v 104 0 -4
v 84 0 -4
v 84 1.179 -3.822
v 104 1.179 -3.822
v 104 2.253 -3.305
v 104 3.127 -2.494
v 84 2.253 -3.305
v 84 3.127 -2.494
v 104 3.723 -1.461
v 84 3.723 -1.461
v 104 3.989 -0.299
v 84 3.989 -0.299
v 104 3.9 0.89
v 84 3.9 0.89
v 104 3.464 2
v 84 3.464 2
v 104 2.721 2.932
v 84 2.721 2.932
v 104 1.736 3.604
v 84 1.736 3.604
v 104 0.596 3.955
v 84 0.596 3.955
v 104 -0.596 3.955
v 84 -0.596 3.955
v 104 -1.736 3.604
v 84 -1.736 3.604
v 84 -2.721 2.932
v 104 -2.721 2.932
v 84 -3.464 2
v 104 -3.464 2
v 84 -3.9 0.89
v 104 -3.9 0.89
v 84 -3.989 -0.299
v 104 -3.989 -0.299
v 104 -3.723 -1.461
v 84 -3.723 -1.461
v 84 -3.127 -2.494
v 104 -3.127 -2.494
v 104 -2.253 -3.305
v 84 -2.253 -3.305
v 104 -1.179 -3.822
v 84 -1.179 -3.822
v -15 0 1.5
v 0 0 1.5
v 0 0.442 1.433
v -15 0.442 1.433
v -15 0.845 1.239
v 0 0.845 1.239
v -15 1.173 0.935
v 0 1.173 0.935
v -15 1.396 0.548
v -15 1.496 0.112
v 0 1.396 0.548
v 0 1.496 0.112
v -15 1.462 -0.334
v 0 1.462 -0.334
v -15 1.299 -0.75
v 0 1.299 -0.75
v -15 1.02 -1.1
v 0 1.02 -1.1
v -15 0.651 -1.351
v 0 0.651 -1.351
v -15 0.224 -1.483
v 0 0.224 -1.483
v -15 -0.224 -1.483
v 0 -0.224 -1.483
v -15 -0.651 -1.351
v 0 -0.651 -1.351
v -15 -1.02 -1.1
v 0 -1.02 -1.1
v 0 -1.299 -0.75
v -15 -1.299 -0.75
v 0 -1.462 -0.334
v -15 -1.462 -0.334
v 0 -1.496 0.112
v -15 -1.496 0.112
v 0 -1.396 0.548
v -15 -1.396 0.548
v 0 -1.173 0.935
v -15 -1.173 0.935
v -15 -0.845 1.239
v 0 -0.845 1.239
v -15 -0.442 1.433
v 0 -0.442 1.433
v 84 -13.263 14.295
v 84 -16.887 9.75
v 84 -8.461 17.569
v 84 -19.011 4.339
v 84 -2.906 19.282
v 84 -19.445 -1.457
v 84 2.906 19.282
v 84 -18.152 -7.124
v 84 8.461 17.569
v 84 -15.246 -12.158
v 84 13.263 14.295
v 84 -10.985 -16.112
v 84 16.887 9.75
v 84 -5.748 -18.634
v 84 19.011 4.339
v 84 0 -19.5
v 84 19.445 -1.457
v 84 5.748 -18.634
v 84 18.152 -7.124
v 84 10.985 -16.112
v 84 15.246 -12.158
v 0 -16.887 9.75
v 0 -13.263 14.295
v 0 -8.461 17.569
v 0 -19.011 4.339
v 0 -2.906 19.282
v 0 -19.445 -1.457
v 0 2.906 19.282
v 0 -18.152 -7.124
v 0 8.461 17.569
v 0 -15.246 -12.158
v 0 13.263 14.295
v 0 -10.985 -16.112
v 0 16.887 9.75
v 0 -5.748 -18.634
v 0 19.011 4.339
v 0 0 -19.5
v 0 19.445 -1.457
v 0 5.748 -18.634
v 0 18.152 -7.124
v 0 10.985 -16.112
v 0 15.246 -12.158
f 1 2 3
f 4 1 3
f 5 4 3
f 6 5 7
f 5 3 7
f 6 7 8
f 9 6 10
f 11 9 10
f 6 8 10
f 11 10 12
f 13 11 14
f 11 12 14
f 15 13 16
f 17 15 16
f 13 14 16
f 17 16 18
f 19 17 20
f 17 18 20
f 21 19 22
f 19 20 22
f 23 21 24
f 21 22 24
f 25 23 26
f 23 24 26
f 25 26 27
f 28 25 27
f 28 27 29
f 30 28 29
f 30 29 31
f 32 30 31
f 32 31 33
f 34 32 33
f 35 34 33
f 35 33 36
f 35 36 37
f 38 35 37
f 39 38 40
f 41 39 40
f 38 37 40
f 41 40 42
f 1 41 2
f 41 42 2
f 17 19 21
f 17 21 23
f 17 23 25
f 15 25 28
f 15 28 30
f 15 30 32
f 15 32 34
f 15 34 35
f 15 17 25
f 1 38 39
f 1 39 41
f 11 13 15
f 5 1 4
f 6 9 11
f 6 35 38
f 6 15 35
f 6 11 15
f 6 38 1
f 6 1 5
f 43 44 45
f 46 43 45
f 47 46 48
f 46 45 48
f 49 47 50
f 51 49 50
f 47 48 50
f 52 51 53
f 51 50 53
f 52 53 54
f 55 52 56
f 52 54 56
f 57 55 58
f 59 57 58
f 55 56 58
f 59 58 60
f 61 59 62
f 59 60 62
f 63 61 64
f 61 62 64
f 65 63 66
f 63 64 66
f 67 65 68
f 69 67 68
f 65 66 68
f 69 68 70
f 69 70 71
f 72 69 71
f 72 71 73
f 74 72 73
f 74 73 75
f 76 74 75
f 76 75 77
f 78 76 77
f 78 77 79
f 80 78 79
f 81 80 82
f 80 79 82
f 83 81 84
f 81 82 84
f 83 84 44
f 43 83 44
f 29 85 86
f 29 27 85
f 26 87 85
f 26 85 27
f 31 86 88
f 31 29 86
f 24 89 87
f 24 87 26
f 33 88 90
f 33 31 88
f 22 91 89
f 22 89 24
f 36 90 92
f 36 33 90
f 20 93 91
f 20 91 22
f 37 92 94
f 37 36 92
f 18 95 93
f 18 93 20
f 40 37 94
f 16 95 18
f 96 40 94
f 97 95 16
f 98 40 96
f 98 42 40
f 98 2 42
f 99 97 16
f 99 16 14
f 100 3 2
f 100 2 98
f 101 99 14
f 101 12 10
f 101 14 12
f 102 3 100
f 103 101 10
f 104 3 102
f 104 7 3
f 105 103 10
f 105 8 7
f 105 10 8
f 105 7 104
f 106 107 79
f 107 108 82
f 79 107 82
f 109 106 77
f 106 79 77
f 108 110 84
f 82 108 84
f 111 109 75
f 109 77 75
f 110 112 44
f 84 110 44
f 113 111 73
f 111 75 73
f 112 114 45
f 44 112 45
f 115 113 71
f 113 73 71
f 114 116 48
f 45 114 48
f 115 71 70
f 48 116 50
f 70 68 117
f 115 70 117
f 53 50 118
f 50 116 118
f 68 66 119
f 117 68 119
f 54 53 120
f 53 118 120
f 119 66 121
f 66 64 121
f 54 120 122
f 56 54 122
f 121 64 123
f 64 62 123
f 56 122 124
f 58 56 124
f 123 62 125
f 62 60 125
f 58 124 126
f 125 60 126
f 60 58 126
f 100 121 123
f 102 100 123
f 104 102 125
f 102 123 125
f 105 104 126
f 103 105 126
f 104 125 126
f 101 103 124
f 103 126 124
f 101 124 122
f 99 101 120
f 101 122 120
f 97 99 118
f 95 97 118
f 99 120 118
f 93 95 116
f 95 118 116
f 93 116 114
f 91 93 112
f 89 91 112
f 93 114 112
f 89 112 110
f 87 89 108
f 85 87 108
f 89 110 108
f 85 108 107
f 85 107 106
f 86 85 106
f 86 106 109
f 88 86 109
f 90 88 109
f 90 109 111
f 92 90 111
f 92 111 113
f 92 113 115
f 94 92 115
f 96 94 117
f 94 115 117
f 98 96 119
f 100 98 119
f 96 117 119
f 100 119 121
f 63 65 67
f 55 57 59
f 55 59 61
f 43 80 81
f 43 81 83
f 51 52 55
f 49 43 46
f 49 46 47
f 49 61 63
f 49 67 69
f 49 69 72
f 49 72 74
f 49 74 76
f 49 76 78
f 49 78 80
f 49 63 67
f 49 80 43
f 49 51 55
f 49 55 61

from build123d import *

# Parameters (mm, degrees)
SKETCH1_R           = 19.5
BOSS_EXTRUDE1_DEPTH = 84
SKETCH2_R           = 4
BOSS_EXTRUDE2_DEPTH = 20
SKETCH3_R           = 1.5
BOSS_EXTRUDE3_DEPTH = 15


with BuildPart() as part:
    # Sketch1 → Boss-Extrude1 (new body)
    with BuildSketch(Plane(origin=(0, 0, 0), x_dir=(0, 0, -1), z_dir=(1, 0, 0))):
        Circle(SKETCH1_R)
    extrude(amount=BOSS_EXTRUDE1_DEPTH)

    # Sketch2 → Boss-Extrude2 (add)
    with BuildSketch(Plane(origin=(84, 0, 0), x_dir=(0, 0, -1), z_dir=(1, 0, 0))):
        Circle(SKETCH2_R)
    extrude(amount=BOSS_EXTRUDE2_DEPTH)

    # Sketch3 → Boss-Extrude3 (add)
    with BuildSketch(Plane.ZY):
        Circle(SKETCH3_R)
    extrude(amount=BOSS_EXTRUDE3_DEPTH)


solid = part.part
